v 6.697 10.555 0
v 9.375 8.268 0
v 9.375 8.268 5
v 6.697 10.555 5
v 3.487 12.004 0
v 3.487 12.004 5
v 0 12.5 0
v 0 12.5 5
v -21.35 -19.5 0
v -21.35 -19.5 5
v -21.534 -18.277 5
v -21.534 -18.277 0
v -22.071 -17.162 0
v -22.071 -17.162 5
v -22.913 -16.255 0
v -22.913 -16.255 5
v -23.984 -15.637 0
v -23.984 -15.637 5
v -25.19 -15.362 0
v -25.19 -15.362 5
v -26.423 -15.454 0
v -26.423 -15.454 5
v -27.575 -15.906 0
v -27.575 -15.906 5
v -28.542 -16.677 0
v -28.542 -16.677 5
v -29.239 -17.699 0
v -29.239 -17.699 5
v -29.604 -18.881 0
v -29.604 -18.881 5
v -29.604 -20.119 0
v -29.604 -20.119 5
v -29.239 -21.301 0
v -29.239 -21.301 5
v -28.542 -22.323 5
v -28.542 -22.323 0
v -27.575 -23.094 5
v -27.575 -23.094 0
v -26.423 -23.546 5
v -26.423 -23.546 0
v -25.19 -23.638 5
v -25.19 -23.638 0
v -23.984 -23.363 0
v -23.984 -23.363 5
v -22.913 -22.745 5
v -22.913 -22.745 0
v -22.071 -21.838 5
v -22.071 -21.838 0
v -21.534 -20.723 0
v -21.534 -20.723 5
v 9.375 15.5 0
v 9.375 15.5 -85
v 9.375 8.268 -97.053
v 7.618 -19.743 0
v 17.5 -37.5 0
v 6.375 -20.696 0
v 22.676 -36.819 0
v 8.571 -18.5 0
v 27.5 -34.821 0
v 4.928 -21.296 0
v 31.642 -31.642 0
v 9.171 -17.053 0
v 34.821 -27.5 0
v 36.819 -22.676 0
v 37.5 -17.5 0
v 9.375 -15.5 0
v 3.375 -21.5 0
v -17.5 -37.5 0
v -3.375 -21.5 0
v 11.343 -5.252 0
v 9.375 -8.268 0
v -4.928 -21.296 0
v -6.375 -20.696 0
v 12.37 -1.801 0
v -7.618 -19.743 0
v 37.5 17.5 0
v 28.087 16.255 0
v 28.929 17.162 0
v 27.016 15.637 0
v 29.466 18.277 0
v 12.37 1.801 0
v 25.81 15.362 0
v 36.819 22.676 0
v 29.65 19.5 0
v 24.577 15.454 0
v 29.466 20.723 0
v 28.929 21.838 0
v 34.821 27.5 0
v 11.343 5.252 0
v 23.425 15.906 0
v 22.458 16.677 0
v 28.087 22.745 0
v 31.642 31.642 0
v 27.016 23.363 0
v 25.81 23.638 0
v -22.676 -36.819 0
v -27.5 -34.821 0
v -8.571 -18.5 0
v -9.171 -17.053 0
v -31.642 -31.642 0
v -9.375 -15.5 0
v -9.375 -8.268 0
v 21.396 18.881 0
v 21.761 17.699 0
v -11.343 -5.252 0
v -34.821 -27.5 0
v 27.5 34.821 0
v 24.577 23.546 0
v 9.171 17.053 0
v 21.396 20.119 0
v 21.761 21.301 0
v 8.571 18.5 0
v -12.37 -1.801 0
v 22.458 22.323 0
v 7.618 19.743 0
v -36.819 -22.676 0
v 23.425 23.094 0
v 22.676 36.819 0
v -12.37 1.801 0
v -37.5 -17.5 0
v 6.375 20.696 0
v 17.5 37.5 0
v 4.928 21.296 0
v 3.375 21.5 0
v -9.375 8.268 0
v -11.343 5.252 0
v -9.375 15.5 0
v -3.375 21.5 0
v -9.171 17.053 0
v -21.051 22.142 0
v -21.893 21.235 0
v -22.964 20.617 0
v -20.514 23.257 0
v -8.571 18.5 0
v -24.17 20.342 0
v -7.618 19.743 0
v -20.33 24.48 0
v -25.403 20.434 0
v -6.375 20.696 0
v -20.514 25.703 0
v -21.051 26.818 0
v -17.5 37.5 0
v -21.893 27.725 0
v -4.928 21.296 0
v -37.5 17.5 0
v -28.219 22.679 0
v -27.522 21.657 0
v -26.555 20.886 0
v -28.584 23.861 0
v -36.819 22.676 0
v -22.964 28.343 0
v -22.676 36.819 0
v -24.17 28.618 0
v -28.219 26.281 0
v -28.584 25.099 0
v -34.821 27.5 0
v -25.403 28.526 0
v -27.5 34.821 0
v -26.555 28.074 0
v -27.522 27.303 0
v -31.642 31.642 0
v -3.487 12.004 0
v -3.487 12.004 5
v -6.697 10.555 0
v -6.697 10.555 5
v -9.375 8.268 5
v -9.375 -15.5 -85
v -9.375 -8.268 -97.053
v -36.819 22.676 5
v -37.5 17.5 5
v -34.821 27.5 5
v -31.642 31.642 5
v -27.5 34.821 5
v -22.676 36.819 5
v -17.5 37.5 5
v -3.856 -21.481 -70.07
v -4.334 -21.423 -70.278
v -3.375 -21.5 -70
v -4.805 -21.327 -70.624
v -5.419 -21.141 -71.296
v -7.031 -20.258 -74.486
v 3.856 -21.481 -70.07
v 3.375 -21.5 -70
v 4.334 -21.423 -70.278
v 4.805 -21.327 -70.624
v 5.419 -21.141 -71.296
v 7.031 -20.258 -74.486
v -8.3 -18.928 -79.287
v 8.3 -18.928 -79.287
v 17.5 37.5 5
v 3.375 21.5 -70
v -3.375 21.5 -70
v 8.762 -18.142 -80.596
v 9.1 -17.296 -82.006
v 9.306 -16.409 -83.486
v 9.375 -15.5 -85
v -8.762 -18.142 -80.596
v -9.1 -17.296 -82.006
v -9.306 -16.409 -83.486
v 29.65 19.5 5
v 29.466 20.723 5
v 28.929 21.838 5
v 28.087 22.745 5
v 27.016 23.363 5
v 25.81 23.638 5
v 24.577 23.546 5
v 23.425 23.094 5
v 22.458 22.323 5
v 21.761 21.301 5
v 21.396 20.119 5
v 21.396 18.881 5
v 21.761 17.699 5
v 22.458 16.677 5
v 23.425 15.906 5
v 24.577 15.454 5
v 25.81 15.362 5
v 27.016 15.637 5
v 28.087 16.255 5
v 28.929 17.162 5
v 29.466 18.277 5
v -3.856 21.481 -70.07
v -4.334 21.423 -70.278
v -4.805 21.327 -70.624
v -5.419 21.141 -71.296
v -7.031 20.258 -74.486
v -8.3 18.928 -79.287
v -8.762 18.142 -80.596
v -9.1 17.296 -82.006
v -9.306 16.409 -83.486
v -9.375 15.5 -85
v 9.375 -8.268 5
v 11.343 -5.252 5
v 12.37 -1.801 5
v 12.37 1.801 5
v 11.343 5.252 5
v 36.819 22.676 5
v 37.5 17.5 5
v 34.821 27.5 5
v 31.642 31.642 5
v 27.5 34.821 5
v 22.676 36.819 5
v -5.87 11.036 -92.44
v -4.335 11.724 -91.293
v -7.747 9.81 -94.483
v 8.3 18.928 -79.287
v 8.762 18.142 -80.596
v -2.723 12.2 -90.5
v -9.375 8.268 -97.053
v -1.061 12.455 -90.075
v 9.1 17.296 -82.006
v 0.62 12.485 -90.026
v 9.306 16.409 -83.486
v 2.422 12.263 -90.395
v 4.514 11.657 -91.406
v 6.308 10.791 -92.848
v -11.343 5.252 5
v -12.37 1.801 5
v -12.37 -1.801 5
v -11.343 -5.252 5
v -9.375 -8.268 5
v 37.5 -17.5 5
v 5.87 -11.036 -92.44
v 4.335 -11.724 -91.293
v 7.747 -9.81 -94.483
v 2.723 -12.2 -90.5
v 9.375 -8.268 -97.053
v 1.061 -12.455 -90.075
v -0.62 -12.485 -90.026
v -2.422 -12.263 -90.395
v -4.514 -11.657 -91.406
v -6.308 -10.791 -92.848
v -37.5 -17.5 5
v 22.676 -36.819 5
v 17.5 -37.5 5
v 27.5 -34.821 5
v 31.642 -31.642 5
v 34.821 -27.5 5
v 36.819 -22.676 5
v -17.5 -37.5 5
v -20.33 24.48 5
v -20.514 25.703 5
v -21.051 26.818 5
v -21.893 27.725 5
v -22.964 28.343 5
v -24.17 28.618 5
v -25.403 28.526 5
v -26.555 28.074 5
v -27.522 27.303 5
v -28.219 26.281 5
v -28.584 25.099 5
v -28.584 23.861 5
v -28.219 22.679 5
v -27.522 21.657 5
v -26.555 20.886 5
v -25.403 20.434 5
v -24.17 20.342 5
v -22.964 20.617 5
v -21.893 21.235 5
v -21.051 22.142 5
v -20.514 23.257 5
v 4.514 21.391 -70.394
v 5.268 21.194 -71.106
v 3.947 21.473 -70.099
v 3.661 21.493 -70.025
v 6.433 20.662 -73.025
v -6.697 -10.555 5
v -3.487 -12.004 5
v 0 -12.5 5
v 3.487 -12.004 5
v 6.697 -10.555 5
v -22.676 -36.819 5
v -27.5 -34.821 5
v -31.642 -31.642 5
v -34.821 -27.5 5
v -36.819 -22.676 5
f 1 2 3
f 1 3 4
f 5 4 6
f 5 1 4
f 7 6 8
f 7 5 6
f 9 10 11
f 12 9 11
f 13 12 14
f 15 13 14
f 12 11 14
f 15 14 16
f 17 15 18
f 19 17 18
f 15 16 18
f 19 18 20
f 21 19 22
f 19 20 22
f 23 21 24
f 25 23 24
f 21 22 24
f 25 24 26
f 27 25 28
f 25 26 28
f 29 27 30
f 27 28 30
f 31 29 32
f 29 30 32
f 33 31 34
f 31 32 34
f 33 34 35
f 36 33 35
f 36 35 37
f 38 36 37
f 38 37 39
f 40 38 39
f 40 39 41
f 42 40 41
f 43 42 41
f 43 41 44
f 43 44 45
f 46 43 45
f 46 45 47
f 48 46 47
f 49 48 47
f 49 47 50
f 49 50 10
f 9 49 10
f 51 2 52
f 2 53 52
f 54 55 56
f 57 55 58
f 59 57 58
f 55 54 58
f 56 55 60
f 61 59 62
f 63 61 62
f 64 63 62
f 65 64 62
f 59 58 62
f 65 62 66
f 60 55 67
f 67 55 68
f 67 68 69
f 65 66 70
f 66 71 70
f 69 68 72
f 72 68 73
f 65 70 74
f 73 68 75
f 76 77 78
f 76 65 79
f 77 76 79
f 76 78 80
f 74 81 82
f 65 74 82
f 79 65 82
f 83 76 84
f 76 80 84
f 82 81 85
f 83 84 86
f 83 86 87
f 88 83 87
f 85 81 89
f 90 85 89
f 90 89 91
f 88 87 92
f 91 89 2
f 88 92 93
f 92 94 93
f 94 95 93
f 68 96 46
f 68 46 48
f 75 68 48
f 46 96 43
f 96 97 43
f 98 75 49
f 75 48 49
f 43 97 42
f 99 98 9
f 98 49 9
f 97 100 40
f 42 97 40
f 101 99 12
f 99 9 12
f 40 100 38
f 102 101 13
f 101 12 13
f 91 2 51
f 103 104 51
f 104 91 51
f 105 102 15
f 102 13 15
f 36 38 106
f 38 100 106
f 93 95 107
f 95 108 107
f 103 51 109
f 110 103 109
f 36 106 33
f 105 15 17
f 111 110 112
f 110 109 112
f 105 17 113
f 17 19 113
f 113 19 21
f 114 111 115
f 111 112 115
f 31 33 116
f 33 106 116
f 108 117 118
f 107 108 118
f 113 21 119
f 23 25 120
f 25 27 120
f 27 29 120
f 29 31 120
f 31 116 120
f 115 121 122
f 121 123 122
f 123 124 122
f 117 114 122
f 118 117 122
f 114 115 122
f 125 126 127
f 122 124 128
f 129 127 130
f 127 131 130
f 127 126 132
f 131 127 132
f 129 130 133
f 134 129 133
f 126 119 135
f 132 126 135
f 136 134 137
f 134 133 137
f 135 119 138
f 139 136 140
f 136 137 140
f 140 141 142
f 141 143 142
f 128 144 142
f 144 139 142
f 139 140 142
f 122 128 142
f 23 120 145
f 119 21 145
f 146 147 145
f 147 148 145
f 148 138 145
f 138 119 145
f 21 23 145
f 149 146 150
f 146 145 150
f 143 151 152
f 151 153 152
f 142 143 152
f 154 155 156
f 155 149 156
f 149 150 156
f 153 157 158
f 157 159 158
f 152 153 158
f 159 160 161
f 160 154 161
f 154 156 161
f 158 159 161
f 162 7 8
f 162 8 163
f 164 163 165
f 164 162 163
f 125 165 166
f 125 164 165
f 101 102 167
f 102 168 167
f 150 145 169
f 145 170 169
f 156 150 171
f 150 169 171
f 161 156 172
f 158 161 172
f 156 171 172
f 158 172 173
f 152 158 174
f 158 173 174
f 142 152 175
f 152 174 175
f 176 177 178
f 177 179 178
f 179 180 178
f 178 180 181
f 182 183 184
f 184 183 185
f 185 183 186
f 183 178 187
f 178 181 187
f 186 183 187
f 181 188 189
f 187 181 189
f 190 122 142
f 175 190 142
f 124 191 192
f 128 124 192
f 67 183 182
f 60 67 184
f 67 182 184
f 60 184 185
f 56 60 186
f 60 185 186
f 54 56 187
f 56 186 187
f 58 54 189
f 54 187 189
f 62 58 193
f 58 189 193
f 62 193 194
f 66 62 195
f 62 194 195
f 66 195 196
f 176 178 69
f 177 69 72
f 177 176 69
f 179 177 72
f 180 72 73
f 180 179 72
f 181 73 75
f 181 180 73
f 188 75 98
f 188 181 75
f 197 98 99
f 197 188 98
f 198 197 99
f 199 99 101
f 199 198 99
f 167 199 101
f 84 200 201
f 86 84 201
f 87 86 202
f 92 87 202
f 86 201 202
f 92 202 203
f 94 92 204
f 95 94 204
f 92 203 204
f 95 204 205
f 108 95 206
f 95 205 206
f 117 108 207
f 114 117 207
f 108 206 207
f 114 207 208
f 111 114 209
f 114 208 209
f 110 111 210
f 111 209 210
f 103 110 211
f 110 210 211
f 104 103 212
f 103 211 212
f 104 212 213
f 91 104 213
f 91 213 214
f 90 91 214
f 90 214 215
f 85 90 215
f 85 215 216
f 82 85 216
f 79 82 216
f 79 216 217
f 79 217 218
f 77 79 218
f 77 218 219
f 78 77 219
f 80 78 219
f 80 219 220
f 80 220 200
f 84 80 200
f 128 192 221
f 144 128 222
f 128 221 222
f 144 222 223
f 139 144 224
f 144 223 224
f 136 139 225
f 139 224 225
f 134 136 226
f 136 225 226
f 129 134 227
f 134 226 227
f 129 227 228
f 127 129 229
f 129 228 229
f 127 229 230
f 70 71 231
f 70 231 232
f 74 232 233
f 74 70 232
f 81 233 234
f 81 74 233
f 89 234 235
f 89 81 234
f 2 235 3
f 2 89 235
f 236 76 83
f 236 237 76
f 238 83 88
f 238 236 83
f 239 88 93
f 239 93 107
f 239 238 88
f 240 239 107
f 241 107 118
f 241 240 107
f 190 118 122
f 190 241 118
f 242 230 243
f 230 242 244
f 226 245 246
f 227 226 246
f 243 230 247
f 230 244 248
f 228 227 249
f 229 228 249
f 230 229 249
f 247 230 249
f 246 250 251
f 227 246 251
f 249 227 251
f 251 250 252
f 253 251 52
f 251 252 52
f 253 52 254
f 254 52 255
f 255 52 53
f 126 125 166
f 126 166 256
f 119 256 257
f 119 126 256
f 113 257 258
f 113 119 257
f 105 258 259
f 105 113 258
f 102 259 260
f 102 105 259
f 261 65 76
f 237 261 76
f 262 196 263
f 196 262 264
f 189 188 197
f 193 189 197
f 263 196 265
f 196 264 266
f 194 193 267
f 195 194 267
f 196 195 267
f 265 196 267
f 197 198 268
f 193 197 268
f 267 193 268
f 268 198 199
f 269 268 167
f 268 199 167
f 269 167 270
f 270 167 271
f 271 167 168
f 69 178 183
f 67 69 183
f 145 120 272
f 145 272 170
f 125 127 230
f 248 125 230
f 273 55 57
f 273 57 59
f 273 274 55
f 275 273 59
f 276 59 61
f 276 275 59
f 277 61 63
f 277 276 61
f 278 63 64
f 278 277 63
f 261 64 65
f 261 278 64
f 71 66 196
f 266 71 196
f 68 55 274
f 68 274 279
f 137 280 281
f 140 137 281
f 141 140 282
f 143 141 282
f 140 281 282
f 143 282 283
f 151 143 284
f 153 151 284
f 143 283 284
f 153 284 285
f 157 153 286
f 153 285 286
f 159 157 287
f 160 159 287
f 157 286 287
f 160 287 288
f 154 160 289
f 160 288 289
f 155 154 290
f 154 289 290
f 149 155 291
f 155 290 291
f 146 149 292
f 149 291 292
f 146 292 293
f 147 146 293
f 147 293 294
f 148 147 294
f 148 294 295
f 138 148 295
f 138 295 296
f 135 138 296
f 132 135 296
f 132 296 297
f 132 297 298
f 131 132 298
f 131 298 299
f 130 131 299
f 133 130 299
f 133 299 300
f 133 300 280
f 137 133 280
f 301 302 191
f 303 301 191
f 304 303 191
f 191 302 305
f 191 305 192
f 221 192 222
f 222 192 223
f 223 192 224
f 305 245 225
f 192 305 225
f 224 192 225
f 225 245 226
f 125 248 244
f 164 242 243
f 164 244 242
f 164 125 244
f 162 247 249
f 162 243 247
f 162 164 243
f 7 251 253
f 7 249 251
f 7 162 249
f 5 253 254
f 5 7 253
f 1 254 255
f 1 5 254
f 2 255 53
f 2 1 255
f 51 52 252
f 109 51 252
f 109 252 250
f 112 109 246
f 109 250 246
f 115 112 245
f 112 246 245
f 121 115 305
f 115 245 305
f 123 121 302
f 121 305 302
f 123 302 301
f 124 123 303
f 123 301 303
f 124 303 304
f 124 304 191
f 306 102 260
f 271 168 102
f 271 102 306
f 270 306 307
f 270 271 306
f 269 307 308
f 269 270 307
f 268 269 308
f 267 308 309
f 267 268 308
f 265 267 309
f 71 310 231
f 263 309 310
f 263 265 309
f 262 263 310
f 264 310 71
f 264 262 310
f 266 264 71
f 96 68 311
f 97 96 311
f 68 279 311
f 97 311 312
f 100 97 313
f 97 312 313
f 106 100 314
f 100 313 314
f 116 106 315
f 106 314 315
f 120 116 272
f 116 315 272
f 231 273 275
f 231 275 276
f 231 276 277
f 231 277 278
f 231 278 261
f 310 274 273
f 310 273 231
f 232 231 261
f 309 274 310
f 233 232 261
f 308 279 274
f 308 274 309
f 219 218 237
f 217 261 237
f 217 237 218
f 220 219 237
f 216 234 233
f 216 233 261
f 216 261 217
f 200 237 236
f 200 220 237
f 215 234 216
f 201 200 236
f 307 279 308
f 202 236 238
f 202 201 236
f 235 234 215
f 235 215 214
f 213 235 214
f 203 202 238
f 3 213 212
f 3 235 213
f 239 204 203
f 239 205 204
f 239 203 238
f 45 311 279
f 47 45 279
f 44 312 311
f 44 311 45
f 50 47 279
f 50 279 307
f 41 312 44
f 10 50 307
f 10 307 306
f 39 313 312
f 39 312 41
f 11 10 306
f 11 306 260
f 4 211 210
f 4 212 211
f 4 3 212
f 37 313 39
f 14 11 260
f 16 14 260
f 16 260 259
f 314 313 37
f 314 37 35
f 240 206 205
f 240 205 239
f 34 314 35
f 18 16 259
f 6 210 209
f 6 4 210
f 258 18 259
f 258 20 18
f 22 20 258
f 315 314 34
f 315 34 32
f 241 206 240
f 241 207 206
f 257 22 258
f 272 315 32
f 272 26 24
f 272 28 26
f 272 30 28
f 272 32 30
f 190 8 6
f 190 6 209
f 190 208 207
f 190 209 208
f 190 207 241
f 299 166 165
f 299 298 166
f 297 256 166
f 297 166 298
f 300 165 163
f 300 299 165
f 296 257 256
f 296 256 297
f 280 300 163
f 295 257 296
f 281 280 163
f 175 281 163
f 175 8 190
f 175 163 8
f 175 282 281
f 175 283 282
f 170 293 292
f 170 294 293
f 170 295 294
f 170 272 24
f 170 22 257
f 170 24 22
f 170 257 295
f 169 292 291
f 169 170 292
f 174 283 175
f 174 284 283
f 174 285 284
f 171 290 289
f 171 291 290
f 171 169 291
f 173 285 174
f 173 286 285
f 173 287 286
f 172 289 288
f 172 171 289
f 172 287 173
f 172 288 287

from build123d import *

# Parameters (mm, degrees)
CROQUIS2_W              = 75
CROQUIS2_H              = 75
SALIENTE_EXTRUIR1_DEPTH = 5
SALIENTE_EXTRUIR2_DEPTH = 100
CHAFL_N1_SIZE           = 25
CHAFL_N1_SIZE_2         = 15
CHAFL_N2_SIZE           = 25
CHAFL_N2_SIZE_2         = 15
CORTAR_EXTRUIR1_REACH   = 112.598
CHAFL_N3_SIZE           = 5
REDONDEO1_R             = 6
REDONDEO2_R             = 20
SKETCH1_R               = 4.15
CUT_EXTRUDE2_DEPTH      = 10


with BuildPart() as part:
    # Croquis2 → Saliente-Extruir1 (new body)
    with BuildSketch(Plane(origin=(0, 0, 0), x_dir=(0, 1, 0), z_dir=(0, 0, 1))):
        Rectangle(CROQUIS2_W, CROQUIS2_H)
    extrude(amount=SALIENTE_EXTRUIR1_DEPTH)

    # Croquis2<3> → Saliente-Extruir2 (add)
    with BuildSketch(Plane(origin=(0, 0, 0), x_dir=(0, 1, 0), z_dir=(0, 0, 1))):
        with BuildLine():
            Line((-21.5, 9.375), (-21.5, -9.375))
            Line((-21.5, -9.375), (-8.267972847, -9.375))
            ThreePointArc((-8.267972847, -9.375), (-12.5, 0), (-8.267972847, 9.375))
            Line((-8.267972847, 9.375), (-21.5, 9.375))
        make_face()
        with BuildLine():
            ThreePointArc((8.267972847, 9.375), (12.5, 0), (8.267972847, -9.375))
            Line((8.267972847, -9.375), (21.5, -9.375))
            Line((21.5, -9.375), (21.5, 9.375))
            Line((21.5, 9.375), (8.267972847, 9.375))
        make_face()
    extrude(amount=-SALIENTE_EXTRUIR2_DEPTH)

    # Chaflán1
    # the kernel refuses this chamfer: 25, 15 mm, written as the material it takes off along each edge
    with BuildSketch(Plane(origin=(74.03152743, 21.5, -100), x_dir=(0, 0.01989341895858247, 0.9998021063601227), z_dir=(-1, 0, 0))) as chafl_n1_piece_1:
        Polygon((CHAFL_N1_SIZE * 0.99980210636, -CHAFL_N1_SIZE * 0.0198934189586), (-CHAFL_N1_SIZE_2 * 0.0198934189586, -CHAFL_N1_SIZE_2 * 0.99980210636), (0, 0), align=None)
    extrude(amount=148.06305486, mode=Mode.SUBTRACT)

    # Chaflán2
    # the kernel refuses this chamfer: 25, 15 mm, written as the material it takes off along each edge
    with BuildSketch(Plane(origin=(-74.03152743, -21.5, -100), x_dir=(0, -0.01989341895858247, 0.9998021063601227), z_dir=(1, 0, 0))) as chafl_n2_piece_1:
        Polygon((CHAFL_N2_SIZE * 0.99980210636, -CHAFL_N2_SIZE * 0.0198934189586), (-CHAFL_N2_SIZE_2 * 0.0198934189586, -CHAFL_N2_SIZE_2 * 0.99980210636), (0, 0), align=None)
    extrude(amount=148.06305486, mode=Mode.SUBTRACT)

    # Croquis2<4> → Cortar-Extruir1 (cut, up to next)
    with BuildSketch(Plane(origin=(0, 0, 0), x_dir=(0, 1, 0), z_dir=(0, 0, 1)), mode=Mode.PRIVATE) as cortar_extruir1_sk1:
        with BuildLine():
            ThreePointArc((-8.267972847, 9.375), (-12.5, 0), (-8.267972847, -9.375))
            Line((-8.267972847, -9.375), (8.267972847, -9.375))
            ThreePointArc((8.267972847, -9.375), (11.392972847, -5.142972847), (12.5, 0))
            ThreePointArc((12.5, 0), (11.392972847, 5.142972847), (8.267972847, 9.375))
            Line((8.267972847, 9.375), (-8.267972847, 9.375))
        make_face()
    cortar_extruir1_tool1 = extrude(cortar_extruir1_sk1.sketch, amount=CORTAR_EXTRUIR1_REACH, mode=Mode.PRIVATE) & part.part
    # Croquis2<4> → Cortar-Extruir1 (cut, up to next)
    with BuildSketch(Plane(origin=(0, 0, 0), x_dir=(0, 1, 0), z_dir=(0, 0, 1)), mode=Mode.PRIVATE) as cortar_extruir1_sk2:
        with BuildLine():
            Line((8.267972847, -9.375), (-8.267972847, -9.375))
            ThreePointArc((-8.267972847, -9.375), (0, -12.5), (8.267972847, -9.375))
        make_face()
    cortar_extruir1_tool2 = extrude(cortar_extruir1_sk2.sketch, amount=CORTAR_EXTRUIR1_REACH, mode=Mode.PRIVATE) & part.part
    # Croquis2<4> → Cortar-Extruir1 (cut, up to next)
    with BuildSketch(Plane(origin=(0, 0, 0), x_dir=(0, 1, 0), z_dir=(0, 0, 1)), mode=Mode.PRIVATE) as cortar_extruir1_sk3:
        with BuildLine():
            ThreePointArc((8.267972847, 9.375), (0, 12.5), (-8.267972847, 9.375))
            Line((-8.267972847, 9.375), (8.267972847, 9.375))
        make_face()
    cortar_extruir1_tool3 = extrude(cortar_extruir1_sk3.sketch, amount=CORTAR_EXTRUIR1_REACH, mode=Mode.PRIVATE) & part.part
    add(cortar_extruir1_tool1.solids().sort_by_distance((0, 0, 0))[0], mode=Mode.SUBTRACT)
    add(cortar_extruir1_tool2.solids().sort_by_distance((10.639442, 0, 0))[0], mode=Mode.SUBTRACT)
    add(cortar_extruir1_tool3.solids().sort_by_distance((-10.639442, 0, 0))[0], mode=Mode.SUBTRACT)

    # Chaflán3
    chafl_n3_edges = [part.edges().sort_by_distance(p)[0] for p in [
        (0, 21.5, -75),
        (0, -21.5, -75),
    ]]
    chamfer(chafl_n3_edges, length=CHAFL_N3_SIZE)

    # Redondeo1
    redondeo1_edges = [part.edges().sort_by_distance(p)[0] for p in [
        (-9.375, -21.5, -35),
        (9.375, -21.5, -35),
        (9.375, 21.5, -35),
        (-9.375, 21.5, -35),
    ]]
    fillet(redondeo1_edges, radius=REDONDEO1_R)

    # Redondeo2
    redondeo2_edges = [part.edges().sort_by_distance(p)[0] for p in [
        (37.5, 37.5, 2.5),
        (37.5, -37.5, 2.5),
        (-37.5, -37.5, 2.5),
        (-37.5, 37.5, 2.5),
    ]]
    fillet(redondeo2_edges, radius=REDONDEO2_R)

    # Sketch1 → Cut-Extrude2 (cut)
    with BuildSketch(Plane.XY.offset(5)):
        with Locations((25.5, 19.5)):
            Circle(SKETCH1_R)
        with Locations((-24.48, 24.48)):
            Circle(SKETCH1_R)
        with Locations((-25.5, -19.5)):
            Circle(SKETCH1_R)
    extrude(amount=-CUT_EXTRUDE2_DEPTH, mode=Mode.SUBTRACT)


solid = part.part
